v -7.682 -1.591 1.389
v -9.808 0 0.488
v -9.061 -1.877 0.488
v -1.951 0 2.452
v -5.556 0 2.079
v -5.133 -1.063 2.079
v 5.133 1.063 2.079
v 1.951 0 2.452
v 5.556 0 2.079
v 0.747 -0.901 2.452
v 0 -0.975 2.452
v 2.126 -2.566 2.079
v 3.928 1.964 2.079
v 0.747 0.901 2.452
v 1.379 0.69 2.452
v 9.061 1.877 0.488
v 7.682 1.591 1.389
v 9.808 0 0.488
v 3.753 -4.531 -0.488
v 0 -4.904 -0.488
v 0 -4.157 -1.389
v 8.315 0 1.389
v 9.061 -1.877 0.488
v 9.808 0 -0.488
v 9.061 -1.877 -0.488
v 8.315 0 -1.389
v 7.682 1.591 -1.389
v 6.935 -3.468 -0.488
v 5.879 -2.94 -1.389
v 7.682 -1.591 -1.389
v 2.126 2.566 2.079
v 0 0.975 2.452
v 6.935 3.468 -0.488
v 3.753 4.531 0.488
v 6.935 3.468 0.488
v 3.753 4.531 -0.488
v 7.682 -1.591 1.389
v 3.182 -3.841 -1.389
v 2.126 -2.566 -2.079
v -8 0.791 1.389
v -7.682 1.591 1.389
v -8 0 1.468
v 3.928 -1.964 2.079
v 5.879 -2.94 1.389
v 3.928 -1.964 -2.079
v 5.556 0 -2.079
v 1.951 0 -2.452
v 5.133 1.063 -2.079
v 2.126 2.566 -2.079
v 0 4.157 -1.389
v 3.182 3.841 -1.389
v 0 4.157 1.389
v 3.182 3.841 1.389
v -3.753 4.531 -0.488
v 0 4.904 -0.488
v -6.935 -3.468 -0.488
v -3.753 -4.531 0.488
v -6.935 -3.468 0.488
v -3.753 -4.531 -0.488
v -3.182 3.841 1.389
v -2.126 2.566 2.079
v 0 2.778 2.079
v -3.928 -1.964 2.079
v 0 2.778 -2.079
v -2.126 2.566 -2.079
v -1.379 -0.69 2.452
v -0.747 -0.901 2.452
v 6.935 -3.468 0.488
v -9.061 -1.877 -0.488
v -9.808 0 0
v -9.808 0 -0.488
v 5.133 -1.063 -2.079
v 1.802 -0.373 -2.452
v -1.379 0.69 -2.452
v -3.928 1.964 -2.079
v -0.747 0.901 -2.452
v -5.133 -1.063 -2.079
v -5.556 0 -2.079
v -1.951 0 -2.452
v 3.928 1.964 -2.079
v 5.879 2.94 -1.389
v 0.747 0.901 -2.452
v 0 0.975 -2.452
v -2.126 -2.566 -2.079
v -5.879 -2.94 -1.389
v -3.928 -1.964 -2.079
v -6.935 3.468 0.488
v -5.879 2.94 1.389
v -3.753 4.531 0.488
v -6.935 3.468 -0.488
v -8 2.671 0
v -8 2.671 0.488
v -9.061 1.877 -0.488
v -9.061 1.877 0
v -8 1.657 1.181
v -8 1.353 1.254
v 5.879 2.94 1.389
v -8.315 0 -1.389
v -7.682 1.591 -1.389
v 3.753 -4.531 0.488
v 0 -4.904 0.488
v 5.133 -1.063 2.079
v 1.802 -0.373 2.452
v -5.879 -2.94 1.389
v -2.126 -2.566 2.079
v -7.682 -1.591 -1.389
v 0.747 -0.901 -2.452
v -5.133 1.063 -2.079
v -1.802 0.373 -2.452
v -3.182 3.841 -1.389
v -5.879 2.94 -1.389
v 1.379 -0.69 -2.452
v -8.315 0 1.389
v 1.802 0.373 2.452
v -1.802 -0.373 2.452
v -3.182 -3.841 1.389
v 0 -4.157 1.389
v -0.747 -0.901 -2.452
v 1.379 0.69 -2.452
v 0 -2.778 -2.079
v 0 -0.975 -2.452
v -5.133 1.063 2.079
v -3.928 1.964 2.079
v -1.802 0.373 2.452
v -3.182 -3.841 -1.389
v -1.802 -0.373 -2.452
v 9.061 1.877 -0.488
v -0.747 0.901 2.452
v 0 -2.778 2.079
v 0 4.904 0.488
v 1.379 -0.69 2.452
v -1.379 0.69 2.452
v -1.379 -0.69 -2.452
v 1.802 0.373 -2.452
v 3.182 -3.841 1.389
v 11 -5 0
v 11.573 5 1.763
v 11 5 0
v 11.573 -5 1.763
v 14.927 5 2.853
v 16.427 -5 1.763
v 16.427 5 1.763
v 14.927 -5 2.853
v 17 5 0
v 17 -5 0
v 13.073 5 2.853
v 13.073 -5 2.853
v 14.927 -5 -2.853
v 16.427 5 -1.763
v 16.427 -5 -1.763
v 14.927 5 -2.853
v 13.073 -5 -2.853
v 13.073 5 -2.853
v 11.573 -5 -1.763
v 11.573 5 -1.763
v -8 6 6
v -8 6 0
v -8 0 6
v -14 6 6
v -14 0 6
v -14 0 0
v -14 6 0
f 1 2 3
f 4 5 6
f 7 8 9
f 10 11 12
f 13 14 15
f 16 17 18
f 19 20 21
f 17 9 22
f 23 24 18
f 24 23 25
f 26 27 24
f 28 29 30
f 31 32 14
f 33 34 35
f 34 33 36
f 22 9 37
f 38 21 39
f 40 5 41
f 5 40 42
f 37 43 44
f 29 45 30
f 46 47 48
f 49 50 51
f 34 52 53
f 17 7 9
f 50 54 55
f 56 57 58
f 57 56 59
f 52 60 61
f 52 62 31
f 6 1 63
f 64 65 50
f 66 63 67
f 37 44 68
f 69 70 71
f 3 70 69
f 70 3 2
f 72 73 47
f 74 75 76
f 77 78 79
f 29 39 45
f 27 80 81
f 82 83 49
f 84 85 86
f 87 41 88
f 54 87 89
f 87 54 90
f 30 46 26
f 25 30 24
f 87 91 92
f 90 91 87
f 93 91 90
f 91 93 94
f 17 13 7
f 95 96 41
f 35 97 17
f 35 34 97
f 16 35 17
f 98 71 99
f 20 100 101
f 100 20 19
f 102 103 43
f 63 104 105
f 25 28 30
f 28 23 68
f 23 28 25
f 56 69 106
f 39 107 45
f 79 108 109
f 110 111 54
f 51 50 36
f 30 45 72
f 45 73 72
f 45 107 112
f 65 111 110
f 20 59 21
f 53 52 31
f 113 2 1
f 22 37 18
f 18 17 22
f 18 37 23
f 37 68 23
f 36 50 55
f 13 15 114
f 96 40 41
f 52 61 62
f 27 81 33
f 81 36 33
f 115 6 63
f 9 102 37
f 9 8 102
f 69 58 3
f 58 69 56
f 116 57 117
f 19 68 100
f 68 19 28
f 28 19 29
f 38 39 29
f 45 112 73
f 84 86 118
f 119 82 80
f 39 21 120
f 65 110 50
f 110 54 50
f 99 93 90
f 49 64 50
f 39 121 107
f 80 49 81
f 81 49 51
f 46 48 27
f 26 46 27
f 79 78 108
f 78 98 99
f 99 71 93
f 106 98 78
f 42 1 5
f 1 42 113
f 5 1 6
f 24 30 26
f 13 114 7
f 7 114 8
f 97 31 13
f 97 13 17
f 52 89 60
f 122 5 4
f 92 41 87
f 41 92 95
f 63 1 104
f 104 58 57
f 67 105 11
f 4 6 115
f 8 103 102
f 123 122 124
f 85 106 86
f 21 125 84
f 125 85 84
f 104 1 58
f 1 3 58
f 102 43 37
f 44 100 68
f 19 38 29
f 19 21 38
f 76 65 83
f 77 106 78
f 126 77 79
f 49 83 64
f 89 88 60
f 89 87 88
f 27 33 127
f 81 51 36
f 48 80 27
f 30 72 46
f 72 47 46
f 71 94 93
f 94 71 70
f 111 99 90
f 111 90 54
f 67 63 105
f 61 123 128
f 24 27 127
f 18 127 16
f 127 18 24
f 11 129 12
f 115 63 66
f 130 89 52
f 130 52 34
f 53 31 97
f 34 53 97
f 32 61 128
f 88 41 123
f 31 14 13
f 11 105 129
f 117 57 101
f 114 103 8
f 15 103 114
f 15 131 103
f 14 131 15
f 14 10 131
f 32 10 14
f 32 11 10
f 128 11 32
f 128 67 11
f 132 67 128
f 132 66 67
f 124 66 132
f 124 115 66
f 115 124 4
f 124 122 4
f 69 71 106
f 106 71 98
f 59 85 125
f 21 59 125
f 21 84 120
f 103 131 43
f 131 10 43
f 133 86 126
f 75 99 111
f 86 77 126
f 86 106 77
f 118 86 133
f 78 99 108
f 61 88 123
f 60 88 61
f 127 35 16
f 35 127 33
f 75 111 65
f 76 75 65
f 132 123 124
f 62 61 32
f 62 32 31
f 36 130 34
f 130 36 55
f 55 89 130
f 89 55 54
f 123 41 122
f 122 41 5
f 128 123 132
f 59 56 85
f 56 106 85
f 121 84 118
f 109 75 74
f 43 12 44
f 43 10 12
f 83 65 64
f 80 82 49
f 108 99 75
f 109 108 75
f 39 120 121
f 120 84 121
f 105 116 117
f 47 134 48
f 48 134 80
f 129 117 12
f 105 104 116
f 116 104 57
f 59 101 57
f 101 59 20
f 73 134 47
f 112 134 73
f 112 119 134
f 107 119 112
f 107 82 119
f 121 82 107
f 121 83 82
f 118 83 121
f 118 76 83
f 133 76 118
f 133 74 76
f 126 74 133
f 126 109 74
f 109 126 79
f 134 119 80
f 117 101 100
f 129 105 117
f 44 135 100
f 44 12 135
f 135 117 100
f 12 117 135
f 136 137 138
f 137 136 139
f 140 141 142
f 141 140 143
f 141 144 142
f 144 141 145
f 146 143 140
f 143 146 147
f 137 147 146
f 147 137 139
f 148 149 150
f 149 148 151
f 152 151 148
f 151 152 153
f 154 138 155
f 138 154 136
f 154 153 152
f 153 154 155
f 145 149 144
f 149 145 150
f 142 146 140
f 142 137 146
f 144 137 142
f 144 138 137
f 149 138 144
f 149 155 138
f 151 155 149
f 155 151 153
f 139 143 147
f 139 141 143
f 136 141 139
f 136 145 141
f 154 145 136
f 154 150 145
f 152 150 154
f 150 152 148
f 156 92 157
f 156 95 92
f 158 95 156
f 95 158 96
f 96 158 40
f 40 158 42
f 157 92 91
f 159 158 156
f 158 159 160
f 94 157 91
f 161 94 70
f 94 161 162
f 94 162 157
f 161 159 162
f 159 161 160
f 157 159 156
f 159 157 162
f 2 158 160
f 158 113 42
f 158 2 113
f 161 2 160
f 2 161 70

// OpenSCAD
// non-uniform scale
scale([2, 1, 0.5]) sphere(r=5);

// rotated cylinder
translate([14, 0, 0]) rotate([90, 0, 0]) cylinder(h=10, r=3, center=true);

// non-centered cube at origin
translate([-14, 0, 0]) cube([6, 6, 6]);
